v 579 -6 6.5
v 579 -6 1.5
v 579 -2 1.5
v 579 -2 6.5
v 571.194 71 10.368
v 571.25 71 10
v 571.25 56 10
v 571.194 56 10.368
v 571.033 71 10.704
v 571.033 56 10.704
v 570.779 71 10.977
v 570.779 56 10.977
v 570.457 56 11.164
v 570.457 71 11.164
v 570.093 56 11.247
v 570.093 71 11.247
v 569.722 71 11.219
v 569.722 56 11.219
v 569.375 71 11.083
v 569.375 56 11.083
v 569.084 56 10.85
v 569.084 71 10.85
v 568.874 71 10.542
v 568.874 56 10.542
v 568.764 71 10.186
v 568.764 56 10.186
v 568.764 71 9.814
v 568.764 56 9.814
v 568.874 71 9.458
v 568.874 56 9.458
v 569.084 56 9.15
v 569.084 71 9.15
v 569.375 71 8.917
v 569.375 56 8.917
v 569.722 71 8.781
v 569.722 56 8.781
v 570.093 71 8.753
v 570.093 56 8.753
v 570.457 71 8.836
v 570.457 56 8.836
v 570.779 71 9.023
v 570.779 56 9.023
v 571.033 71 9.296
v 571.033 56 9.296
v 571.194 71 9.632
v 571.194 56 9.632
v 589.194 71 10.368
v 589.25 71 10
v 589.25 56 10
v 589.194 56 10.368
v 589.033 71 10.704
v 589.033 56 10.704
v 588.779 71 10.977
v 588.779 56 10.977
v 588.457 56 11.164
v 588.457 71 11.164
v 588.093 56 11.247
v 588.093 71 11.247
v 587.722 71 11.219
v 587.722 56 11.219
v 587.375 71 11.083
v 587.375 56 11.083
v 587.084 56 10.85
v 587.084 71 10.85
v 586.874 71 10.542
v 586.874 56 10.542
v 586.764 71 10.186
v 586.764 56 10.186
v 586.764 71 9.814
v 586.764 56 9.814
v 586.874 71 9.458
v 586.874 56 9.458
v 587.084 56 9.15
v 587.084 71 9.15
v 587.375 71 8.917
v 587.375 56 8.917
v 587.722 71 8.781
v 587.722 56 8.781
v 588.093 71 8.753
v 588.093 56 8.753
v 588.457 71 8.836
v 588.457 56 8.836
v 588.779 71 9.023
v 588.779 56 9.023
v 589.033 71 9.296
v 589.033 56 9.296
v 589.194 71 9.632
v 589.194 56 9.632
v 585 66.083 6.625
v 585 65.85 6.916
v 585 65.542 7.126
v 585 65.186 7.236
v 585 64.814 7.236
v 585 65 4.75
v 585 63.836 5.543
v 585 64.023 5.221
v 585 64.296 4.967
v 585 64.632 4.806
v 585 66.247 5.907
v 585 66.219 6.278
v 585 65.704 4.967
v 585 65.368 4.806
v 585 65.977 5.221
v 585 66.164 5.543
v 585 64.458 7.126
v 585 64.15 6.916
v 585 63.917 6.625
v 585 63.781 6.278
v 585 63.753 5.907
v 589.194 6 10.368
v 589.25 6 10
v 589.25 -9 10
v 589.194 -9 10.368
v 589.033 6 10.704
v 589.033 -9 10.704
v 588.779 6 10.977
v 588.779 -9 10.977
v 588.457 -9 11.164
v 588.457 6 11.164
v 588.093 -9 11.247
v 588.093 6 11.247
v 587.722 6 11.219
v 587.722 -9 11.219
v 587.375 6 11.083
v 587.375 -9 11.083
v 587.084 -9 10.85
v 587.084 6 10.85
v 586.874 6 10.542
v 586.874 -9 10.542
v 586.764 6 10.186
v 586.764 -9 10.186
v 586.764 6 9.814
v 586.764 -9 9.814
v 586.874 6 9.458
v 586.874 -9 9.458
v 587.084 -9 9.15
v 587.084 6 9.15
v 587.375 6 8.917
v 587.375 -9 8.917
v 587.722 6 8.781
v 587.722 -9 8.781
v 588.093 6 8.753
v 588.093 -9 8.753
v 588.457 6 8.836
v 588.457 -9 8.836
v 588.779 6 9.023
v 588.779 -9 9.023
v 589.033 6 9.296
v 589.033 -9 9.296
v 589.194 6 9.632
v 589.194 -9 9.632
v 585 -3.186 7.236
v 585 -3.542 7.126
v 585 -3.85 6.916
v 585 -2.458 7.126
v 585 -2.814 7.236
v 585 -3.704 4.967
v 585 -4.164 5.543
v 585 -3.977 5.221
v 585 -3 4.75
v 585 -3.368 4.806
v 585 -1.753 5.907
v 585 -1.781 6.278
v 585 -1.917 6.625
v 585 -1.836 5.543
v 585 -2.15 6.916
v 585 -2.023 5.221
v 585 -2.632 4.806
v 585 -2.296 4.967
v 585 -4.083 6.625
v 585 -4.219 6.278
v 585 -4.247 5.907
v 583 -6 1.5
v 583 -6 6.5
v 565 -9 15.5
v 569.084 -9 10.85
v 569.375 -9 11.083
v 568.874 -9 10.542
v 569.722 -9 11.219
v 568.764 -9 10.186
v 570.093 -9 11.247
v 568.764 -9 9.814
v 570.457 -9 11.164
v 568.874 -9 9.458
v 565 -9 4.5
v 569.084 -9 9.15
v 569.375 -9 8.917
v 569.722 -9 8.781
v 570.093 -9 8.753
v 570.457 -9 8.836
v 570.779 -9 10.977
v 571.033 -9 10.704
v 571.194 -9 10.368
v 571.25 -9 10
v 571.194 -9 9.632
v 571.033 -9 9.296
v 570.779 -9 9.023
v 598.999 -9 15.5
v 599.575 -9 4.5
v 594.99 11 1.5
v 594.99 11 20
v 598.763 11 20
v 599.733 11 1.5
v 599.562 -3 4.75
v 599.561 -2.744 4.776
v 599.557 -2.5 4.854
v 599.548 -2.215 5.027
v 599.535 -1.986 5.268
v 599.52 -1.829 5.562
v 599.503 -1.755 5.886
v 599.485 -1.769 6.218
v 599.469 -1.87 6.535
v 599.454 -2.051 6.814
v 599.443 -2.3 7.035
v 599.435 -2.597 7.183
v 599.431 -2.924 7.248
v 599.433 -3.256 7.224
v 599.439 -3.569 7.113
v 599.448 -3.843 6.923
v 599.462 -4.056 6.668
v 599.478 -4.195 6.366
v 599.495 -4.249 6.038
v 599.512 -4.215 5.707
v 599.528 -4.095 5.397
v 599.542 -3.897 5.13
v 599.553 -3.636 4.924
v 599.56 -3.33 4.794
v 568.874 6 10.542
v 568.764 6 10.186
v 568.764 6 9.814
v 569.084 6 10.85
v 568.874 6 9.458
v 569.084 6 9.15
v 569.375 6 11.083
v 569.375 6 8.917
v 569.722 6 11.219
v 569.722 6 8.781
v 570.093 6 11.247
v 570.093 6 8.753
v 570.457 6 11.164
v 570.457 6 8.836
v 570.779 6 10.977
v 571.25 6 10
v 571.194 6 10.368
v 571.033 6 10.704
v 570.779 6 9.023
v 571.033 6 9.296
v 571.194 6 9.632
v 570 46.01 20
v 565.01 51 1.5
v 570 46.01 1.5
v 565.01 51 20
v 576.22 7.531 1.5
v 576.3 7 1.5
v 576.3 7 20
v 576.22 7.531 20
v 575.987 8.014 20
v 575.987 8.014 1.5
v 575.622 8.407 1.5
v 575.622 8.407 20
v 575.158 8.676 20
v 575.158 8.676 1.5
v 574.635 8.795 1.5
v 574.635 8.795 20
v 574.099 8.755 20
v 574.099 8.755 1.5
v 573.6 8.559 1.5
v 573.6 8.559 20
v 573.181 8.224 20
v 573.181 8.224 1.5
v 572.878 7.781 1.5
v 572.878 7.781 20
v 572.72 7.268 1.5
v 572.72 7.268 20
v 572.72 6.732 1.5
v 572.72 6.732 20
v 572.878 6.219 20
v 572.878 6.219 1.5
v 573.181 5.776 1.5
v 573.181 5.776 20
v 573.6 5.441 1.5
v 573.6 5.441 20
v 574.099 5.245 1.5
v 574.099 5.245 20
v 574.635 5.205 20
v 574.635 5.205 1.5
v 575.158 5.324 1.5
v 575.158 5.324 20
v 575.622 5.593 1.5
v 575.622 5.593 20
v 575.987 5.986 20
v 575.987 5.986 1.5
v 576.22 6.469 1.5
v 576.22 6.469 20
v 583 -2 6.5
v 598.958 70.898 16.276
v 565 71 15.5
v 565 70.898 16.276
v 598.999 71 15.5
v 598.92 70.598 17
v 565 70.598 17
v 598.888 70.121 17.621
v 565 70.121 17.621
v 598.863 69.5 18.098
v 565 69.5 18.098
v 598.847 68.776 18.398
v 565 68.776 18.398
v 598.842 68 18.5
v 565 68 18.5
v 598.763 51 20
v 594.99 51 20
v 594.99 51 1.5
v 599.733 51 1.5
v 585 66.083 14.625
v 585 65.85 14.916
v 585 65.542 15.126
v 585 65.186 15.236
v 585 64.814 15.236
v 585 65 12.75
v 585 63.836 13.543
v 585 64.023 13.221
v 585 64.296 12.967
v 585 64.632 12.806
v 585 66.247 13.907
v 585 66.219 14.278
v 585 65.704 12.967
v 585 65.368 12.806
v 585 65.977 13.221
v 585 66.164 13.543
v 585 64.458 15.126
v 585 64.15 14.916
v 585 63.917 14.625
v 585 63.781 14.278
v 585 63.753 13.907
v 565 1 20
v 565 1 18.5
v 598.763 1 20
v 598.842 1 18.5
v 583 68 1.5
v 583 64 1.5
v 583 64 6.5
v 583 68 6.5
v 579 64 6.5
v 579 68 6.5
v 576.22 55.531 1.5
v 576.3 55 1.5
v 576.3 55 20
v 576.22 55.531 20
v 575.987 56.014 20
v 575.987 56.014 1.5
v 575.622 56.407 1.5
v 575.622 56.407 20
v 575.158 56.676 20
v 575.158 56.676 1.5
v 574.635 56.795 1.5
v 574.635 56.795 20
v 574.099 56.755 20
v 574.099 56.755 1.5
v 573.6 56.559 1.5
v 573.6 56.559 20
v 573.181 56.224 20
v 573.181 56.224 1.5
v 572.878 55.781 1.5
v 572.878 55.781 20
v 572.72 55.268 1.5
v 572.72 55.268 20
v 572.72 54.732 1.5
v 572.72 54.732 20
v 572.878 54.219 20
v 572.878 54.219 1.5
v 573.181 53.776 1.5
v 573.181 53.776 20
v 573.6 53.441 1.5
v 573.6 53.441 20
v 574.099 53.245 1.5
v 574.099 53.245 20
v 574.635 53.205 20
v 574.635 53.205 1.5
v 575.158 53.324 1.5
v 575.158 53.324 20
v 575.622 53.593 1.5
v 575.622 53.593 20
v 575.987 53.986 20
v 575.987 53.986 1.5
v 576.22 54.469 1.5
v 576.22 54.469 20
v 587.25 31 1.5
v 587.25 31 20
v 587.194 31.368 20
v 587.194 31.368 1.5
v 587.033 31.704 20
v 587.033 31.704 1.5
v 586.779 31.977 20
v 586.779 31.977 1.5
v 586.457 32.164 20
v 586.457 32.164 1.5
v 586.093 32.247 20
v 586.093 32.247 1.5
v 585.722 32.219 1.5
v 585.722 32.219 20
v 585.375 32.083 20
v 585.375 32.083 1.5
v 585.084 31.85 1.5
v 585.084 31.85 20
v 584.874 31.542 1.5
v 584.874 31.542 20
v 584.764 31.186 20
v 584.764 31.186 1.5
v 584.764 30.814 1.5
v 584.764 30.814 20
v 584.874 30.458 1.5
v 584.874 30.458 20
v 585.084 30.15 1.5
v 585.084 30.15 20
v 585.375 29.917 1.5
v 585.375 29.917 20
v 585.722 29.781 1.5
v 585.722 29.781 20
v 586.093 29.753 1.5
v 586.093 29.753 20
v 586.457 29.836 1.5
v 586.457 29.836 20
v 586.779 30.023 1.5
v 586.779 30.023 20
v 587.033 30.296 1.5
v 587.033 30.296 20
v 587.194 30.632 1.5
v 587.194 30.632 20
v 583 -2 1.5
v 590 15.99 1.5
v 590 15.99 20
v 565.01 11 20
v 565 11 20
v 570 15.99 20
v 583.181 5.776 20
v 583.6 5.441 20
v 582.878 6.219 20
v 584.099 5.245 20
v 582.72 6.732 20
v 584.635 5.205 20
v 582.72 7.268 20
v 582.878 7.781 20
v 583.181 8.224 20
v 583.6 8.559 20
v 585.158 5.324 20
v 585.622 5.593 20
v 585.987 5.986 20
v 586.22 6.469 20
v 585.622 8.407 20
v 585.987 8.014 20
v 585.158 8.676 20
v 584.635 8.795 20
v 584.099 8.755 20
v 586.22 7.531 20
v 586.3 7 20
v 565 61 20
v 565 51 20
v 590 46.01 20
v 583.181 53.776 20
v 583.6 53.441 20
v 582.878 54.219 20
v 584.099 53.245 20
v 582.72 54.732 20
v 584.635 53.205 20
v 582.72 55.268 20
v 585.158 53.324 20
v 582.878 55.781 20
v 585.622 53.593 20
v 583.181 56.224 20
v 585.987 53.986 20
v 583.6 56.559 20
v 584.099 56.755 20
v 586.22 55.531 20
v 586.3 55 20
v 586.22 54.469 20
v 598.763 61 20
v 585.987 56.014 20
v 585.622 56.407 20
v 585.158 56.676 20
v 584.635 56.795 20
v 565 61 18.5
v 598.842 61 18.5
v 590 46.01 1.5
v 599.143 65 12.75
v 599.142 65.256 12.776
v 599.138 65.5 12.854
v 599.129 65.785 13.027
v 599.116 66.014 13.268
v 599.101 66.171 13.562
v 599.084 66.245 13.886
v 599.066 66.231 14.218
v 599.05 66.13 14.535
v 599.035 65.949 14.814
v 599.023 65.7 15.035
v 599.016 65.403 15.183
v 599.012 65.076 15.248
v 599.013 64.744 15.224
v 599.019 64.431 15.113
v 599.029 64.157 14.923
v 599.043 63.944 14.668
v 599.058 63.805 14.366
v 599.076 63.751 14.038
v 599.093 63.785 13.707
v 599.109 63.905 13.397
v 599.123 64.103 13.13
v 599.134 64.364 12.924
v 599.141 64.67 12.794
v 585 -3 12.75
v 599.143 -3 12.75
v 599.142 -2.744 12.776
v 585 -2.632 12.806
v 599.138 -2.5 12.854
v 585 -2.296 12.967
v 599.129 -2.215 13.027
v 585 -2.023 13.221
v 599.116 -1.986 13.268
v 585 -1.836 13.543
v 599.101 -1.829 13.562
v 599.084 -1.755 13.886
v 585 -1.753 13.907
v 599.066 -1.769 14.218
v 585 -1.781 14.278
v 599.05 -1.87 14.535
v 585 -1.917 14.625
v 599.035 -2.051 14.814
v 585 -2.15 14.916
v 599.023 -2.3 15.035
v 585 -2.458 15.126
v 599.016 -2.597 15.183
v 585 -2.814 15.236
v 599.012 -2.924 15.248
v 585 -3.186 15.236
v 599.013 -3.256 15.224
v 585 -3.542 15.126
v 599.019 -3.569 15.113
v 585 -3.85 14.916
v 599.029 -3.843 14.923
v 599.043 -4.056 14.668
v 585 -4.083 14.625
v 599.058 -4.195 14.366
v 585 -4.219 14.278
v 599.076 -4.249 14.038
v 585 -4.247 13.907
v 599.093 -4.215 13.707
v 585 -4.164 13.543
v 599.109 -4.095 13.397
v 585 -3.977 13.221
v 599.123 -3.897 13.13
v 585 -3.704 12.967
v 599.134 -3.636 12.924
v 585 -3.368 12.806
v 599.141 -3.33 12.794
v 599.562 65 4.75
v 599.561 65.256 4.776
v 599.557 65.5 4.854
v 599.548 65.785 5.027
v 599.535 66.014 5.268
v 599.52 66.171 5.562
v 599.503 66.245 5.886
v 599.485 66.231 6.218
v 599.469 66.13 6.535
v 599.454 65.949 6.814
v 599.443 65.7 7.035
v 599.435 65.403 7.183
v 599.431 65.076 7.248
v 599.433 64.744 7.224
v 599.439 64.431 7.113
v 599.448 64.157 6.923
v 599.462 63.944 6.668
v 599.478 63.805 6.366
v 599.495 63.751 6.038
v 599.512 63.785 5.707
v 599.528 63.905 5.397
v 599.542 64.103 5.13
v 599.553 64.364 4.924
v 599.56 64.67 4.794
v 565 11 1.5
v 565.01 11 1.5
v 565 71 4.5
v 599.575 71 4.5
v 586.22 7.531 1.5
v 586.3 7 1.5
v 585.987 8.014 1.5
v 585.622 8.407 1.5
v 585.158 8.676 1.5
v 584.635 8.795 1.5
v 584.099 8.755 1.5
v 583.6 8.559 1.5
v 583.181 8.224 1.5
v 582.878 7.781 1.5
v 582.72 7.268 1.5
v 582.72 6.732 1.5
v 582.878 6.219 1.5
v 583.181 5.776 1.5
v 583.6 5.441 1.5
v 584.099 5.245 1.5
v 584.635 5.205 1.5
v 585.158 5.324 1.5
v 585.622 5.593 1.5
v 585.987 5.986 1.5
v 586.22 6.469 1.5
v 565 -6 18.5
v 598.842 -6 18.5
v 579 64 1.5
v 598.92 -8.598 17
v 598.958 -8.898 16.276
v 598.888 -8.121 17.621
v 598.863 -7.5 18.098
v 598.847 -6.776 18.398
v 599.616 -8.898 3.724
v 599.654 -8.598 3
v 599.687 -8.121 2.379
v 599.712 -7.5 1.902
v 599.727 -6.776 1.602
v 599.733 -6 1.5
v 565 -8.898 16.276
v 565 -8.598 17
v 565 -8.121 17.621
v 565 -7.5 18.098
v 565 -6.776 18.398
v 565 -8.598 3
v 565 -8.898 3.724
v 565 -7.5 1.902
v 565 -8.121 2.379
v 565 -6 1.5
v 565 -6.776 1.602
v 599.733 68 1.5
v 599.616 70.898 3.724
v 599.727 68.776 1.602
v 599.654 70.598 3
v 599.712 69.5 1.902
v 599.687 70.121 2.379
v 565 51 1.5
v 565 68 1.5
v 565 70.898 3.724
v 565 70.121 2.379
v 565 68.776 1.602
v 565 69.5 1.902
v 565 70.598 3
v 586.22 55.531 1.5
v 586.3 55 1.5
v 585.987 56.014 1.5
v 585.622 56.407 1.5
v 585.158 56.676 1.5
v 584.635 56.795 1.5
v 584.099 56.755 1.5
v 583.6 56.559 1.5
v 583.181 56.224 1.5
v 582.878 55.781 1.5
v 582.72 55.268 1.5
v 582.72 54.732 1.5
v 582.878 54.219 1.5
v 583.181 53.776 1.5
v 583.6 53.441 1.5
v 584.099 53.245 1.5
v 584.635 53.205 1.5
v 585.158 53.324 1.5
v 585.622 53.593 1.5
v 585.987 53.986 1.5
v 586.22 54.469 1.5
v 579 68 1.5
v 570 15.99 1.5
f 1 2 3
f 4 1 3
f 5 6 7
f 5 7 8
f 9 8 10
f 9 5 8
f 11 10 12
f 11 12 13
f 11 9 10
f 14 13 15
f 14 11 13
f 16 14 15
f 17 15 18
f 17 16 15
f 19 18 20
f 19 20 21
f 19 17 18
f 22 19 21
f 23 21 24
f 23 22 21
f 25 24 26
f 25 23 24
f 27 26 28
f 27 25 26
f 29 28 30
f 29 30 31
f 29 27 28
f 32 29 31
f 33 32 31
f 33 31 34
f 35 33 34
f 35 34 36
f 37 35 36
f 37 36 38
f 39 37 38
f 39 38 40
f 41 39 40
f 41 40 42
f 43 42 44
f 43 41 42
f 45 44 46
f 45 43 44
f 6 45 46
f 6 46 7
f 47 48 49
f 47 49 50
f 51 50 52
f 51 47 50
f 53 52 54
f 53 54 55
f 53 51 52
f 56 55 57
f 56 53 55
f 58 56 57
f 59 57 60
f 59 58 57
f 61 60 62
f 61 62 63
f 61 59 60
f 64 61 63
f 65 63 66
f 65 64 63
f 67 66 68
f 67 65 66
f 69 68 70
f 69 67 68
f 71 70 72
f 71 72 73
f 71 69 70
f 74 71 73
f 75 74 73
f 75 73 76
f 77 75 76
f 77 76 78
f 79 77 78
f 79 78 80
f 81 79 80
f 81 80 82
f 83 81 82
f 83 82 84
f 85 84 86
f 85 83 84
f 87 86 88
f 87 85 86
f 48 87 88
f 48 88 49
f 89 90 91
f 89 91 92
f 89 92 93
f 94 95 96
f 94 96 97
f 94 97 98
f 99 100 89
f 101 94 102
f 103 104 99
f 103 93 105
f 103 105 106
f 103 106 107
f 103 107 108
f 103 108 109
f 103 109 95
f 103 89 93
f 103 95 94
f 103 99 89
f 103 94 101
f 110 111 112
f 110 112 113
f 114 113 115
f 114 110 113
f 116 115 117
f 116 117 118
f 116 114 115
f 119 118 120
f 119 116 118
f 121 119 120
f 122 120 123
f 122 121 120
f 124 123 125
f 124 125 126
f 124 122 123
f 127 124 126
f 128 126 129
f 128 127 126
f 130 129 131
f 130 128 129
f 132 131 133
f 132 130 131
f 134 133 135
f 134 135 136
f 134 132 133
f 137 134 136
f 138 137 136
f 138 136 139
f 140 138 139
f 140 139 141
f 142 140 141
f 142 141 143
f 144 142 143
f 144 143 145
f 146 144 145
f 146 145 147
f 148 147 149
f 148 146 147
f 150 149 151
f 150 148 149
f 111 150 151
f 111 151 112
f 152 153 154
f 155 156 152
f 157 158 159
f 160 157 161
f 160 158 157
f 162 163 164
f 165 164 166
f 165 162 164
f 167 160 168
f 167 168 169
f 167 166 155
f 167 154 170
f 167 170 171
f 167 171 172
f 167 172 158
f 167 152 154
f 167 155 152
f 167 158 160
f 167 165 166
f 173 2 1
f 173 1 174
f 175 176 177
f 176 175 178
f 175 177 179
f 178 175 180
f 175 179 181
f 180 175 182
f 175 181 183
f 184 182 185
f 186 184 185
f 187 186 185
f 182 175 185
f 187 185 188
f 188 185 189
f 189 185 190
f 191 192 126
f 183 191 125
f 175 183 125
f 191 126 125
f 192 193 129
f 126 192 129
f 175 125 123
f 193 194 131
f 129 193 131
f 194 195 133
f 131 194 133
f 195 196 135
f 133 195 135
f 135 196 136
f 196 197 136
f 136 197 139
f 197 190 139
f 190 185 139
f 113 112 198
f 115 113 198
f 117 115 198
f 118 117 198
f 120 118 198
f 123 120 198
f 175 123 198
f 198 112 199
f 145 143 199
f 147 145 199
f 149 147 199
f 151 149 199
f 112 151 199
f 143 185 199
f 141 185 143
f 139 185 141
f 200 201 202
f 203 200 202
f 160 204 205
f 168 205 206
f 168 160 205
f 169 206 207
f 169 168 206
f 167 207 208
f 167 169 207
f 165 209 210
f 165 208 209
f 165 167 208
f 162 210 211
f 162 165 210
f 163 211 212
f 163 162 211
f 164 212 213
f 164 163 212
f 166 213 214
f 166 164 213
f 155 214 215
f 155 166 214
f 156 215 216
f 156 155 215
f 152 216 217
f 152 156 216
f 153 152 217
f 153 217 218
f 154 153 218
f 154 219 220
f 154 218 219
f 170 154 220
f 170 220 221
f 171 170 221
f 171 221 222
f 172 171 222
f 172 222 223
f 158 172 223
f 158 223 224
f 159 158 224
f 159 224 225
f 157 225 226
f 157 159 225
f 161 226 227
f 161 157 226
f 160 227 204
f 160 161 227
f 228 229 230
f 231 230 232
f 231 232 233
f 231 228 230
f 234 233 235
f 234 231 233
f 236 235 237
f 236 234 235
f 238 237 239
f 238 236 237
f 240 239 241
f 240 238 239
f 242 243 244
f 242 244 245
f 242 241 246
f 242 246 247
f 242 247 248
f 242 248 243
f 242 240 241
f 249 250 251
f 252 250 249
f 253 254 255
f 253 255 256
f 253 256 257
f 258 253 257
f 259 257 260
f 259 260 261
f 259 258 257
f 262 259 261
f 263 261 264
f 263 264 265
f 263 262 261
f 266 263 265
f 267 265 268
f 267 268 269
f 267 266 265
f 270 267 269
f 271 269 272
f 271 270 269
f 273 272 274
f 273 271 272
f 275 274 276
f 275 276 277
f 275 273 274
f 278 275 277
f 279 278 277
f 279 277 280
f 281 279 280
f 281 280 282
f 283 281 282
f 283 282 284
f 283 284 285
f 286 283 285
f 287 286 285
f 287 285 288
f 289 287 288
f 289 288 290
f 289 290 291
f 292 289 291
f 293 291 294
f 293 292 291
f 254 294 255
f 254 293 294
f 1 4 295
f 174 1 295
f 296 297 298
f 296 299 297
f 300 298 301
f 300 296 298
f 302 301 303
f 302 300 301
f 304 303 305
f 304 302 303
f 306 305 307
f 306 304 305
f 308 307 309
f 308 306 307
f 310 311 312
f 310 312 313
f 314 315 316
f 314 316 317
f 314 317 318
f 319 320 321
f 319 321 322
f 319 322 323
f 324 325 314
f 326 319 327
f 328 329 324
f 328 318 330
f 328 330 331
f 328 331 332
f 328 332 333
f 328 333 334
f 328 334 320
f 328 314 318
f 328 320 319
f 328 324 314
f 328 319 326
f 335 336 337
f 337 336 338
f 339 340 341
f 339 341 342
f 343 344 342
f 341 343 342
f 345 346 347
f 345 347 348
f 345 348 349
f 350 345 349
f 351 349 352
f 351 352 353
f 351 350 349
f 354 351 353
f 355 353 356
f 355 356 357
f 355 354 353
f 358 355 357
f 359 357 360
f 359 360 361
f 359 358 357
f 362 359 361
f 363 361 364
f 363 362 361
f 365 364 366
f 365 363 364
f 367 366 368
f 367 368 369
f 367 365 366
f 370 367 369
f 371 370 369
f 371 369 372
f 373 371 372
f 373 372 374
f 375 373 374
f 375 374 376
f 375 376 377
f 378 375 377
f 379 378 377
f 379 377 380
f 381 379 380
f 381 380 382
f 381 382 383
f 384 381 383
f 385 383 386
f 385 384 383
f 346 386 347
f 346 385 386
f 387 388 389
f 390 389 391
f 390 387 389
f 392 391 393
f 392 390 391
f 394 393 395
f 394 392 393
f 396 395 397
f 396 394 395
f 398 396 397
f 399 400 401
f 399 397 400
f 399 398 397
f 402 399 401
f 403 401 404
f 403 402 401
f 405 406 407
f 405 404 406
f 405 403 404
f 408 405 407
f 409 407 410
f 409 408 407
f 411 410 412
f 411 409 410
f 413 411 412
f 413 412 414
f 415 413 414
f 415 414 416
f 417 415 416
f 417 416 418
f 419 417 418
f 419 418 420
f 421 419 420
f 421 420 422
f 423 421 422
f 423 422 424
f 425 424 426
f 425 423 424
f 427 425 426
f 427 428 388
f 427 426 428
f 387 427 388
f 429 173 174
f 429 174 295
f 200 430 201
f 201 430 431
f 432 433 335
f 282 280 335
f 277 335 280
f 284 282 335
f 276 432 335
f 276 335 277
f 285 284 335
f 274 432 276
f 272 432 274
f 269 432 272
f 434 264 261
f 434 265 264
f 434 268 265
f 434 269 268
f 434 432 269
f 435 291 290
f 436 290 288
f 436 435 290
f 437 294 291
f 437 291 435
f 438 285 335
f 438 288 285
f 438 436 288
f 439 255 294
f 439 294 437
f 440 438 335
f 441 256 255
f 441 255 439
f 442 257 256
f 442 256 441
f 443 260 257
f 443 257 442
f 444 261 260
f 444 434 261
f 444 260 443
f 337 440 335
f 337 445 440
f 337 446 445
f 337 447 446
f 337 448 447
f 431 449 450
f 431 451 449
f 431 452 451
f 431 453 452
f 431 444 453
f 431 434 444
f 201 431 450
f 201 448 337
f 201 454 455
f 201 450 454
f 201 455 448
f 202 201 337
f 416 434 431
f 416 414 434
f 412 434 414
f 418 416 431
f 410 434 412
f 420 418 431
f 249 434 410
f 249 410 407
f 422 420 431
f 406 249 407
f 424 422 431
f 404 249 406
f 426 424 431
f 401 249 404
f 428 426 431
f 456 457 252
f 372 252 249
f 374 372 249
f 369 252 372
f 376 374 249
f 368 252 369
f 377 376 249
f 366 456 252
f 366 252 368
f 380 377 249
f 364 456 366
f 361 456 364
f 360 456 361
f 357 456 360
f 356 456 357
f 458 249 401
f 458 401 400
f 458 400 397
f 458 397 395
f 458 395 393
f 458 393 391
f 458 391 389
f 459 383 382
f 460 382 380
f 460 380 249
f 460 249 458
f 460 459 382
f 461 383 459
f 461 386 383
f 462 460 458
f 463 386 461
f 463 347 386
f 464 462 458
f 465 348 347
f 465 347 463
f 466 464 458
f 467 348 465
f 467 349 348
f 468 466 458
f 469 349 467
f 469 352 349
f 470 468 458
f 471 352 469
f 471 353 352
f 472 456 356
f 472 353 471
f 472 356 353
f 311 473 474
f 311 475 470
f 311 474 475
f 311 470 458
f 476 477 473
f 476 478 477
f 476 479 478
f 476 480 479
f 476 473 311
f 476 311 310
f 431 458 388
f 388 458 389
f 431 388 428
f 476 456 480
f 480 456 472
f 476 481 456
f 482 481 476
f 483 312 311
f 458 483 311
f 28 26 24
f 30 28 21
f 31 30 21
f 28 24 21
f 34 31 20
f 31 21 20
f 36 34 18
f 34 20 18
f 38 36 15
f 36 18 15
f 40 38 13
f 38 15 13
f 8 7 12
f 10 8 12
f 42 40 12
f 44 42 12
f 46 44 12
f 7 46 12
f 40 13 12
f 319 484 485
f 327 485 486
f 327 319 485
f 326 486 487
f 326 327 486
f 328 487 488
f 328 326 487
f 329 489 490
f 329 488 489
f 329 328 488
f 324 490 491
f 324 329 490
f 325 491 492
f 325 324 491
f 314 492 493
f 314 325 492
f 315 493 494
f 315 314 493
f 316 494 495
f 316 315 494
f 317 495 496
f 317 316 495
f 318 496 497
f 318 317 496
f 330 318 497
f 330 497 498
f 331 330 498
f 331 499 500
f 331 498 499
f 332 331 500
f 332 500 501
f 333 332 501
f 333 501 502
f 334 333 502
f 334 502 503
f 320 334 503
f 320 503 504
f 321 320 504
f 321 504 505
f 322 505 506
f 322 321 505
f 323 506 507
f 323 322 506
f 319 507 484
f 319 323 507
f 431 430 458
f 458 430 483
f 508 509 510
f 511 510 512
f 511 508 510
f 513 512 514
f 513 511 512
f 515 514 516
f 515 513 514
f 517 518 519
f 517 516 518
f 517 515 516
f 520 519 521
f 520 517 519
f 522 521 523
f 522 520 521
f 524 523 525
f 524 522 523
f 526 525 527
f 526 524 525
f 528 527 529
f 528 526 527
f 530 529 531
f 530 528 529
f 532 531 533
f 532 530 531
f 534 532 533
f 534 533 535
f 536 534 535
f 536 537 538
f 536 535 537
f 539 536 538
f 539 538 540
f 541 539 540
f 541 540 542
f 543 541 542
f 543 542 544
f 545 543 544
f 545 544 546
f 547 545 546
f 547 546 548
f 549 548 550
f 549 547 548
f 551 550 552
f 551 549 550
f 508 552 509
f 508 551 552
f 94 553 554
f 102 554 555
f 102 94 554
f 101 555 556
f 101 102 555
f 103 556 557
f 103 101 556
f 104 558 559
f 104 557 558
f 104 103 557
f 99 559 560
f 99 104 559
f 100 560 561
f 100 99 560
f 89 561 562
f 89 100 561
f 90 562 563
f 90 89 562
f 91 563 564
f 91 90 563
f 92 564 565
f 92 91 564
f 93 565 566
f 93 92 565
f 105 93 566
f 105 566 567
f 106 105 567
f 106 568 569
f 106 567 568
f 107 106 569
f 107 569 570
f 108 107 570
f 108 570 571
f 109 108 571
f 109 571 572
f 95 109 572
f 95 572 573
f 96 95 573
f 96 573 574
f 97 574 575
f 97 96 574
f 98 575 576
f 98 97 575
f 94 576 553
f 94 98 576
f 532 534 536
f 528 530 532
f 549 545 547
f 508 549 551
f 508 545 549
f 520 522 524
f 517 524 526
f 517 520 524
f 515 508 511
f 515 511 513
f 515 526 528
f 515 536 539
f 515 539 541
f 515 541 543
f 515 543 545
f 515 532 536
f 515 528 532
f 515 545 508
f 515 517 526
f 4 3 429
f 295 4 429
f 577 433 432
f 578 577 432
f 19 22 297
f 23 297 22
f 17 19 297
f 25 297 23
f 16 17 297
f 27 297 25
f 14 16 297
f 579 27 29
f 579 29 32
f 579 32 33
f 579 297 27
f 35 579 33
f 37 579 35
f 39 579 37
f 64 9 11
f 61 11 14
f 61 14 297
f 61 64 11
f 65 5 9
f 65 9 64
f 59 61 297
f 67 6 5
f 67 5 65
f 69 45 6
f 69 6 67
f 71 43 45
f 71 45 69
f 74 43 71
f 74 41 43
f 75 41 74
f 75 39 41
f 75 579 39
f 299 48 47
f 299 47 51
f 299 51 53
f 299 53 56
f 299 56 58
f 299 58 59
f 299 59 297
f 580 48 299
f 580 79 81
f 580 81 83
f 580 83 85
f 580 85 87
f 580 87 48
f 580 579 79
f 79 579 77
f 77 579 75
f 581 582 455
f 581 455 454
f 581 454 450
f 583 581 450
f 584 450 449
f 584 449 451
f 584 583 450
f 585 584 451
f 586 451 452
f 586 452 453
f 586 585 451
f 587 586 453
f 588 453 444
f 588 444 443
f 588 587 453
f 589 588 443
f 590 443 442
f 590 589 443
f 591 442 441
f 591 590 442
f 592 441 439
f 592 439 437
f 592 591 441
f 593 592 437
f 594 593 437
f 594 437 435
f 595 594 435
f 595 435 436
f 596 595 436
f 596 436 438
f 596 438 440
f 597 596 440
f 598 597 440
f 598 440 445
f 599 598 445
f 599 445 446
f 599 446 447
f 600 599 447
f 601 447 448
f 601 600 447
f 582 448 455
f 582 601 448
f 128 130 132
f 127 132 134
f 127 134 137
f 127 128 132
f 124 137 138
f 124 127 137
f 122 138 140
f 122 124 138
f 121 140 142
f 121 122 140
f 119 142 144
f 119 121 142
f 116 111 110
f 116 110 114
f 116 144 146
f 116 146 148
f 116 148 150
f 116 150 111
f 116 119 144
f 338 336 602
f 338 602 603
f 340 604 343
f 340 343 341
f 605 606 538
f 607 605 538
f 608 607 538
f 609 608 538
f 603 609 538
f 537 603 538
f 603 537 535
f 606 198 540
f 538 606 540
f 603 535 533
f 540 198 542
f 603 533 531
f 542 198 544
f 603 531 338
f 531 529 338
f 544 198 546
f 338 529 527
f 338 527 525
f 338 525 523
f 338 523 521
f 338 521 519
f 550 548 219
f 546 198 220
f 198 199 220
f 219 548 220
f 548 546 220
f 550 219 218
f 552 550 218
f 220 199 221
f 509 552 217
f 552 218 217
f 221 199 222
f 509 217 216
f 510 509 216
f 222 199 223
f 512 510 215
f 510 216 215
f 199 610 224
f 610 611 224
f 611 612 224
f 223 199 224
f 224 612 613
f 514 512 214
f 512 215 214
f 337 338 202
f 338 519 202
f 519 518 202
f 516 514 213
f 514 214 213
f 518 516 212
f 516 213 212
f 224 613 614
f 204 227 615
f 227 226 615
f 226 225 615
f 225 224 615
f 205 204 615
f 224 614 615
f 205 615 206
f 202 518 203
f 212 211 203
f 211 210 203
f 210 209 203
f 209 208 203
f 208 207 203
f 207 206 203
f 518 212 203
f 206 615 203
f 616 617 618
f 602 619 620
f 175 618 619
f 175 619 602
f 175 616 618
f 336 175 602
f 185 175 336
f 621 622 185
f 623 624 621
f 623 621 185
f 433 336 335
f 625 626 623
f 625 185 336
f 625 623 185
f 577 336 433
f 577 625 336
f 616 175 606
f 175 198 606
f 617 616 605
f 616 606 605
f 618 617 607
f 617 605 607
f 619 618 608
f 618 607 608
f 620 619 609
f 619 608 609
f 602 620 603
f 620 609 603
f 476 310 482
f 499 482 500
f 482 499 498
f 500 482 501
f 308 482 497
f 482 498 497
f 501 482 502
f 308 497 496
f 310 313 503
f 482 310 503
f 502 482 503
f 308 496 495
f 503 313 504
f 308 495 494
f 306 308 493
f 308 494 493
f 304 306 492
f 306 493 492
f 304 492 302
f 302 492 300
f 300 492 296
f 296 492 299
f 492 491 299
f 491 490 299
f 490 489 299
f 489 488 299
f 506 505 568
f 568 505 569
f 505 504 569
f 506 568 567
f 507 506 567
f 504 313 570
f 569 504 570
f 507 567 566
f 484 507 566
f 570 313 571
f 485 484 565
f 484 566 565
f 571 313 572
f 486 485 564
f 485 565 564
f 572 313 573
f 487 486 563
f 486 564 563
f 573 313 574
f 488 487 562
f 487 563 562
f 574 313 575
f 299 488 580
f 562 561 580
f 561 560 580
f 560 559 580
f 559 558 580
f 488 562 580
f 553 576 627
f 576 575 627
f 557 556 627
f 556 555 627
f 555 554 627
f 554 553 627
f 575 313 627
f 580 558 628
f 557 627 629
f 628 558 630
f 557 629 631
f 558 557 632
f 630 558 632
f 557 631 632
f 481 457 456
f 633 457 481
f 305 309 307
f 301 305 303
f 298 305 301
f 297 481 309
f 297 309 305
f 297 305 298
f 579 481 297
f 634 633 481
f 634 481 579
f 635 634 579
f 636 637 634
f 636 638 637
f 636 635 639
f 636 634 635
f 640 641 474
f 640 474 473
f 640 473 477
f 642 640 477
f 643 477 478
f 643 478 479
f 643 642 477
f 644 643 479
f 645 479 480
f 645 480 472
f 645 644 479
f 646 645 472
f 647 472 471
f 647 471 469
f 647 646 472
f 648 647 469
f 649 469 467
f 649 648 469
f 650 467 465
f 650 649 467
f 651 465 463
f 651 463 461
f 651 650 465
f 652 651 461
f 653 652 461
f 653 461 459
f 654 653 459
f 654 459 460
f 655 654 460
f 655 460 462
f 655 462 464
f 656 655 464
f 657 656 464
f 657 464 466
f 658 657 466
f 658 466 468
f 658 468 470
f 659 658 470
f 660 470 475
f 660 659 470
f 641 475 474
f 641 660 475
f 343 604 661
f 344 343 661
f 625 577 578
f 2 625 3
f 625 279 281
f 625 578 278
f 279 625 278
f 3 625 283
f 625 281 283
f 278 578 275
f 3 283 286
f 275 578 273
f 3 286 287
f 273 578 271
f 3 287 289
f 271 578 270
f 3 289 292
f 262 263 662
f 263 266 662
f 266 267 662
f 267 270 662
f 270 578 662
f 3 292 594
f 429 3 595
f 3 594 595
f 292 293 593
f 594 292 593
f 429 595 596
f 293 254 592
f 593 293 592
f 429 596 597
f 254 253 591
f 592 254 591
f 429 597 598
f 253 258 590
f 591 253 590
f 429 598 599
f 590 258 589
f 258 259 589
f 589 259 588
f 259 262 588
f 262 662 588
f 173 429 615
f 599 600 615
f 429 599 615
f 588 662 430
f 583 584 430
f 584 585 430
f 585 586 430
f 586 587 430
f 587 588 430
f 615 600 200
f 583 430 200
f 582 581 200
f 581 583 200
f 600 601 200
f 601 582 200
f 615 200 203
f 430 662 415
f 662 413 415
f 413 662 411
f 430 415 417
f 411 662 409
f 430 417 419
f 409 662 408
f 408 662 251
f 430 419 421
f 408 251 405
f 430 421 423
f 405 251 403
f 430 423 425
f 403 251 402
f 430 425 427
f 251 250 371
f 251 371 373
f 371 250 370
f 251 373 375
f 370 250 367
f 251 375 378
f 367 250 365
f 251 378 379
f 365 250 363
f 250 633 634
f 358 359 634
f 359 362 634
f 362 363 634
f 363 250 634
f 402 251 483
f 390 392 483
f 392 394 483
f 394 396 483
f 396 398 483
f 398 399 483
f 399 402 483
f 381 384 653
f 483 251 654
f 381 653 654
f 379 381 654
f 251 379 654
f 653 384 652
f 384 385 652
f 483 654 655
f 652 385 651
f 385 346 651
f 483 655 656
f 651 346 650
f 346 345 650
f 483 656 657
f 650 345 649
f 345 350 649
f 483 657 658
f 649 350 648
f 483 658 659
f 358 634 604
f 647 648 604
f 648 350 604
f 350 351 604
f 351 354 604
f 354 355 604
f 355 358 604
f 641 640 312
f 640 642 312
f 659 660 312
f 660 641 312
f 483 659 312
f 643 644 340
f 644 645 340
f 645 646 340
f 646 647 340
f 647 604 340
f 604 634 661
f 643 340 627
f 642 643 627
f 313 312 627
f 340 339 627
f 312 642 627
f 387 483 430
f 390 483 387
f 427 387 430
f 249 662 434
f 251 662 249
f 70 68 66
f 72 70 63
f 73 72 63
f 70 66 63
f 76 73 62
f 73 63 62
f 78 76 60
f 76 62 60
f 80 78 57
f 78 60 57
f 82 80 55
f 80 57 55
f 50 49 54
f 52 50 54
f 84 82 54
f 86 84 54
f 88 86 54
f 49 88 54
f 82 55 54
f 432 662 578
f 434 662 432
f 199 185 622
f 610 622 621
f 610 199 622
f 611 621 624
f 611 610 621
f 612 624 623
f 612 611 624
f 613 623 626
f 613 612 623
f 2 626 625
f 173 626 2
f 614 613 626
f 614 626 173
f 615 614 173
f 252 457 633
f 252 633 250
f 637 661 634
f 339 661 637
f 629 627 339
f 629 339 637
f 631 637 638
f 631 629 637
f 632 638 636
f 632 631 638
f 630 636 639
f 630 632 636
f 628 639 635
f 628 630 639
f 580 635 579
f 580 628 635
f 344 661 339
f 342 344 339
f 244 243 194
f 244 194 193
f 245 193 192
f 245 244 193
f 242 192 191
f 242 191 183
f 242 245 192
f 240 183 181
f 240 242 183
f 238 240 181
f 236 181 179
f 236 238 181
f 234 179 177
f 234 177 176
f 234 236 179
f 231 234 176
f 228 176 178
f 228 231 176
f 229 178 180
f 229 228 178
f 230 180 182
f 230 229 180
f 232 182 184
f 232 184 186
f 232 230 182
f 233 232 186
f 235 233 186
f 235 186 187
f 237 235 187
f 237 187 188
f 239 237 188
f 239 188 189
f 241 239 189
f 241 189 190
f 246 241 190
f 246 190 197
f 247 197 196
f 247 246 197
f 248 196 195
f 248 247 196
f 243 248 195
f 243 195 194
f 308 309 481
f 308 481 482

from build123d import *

# Parameters (mm, degrees)
CYLINDER445_R          = 1.25
CYLINDER445_DEPTH      = 20
BOX297_W               = 4
BOX297_H               = 4
BOX297_DEPTH           = 5
BOX298_W               = 4
BOX298_H               = 4
BOX298_DEPTH           = 5
CYLINDER444_R          = 1.25
CYLINDER444_DEPTH      = 15
CYLINDER443_R          = 1.25
CYLINDER443_DEPTH      = 15
CYLINDER442_R          = 1.25
CYLINDER442_DEPTH      = 15
CYLINDER441_R          = 1.25
CYLINDER441_DEPTH      = 15
CYLINDER450_R          = 1.8
CYLINDER450_DEPTH      = 18.5
CYLINDER451_R          = 1.8
CYLINDER451_DEPTH      = 18.5
CYLINDER446_R          = 1.8
CYLINDER446_DEPTH      = 18.5
CYLINDER447_R          = 1.8
CYLINDER447_DEPTH      = 18.5
CYLINDER449_R          = 1.25
CYLINDER449_DEPTH      = 15
CYLINDER448_R          = 1.25
CYLINDER448_DEPTH      = 15
CYLINDER440_R          = 1.25
CYLINDER440_DEPTH      = 15
CYLINDER439_R          = 1.25
CYLINDER439_DEPTH      = 15
BOX293_W               = 10
BOX293_H               = 82
BOX293_DEPTH           = 32
BOX293_PLACEMENT_ANGLE = 3
BOX300_W               = 35
BOX300_H               = 10
BOX300_DEPTH           = 1.5
BOX295_W               = 35
BOX295_H               = 20
BOX295_DEPTH           = 17
BOX292_W               = 35
BOX292_H               = 20
BOX292_DEPTH           = 17
BOX296_W               = 20
BOX296_H               = 40
BOX296_DEPTH           = 18.5
BOX299_W               = 35
BOX299_H               = 10
BOX299_DEPTH           = 1.5
FILLET107_R            = 3
CHAMFER030_SIZE        = 4.99


with BuildPart() as cylinder445:
    # Cylinder445 → Cylinder445 (new body)
    with BuildSketch(Plane(origin=(586, 31, 1.5), x_dir=(1, 0, 0), z_dir=(0, 0, 1))):
        Circle(CYLINDER445_R)
    extrude(amount=CYLINDER445_DEPTH)


with BuildPart() as box297:
    # Box297 → Box297 (new body)
    with BuildSketch(Plane(origin=(579, -6, 1.5), x_dir=(1, 0, 0), z_dir=(0, 0, 1))):
        with Locations((2, 2)):
            Rectangle(BOX297_W, BOX297_H)
    extrude(amount=BOX297_DEPTH)


with BuildPart() as fusion398:
    # Box298 → Box298 (new body)
    with BuildSketch(Plane(origin=(579, 64, 1.5), x_dir=(1, 0, 0), z_dir=(0, 0, 1))):
        with Locations((2, 2)):
            Rectangle(BOX298_W, BOX298_H)
    extrude(amount=BOX298_DEPTH)

    # Fusion398: union Box297
    add(box297.part)


with BuildPart() as cylinder444:
    # Cylinder444 → Cylinder444 (new body)
    with BuildSketch(Plane(origin=(585, 7, 6), x_dir=(0, 0, -1), z_dir=(1, 0, 0))):
        Circle(CYLINDER444_R)
    extrude(amount=CYLINDER444_DEPTH)


with BuildPart() as fusion396:
    # Cylinder443 → Cylinder443 (new body)
    with BuildSketch(Plane(origin=(585, 7, 14), x_dir=(0, 0, -1), z_dir=(1, 0, 0))):
        Circle(CYLINDER443_R)
    extrude(amount=CYLINDER443_DEPTH)

    # Fusion396: union Cylinder444
    add(cylinder444.part)


with BuildPart() as fusion396_1:
    # Fusion396 placement: moved
    add(fusion396.part.moved(Location((0, 58, 0))))


with BuildPart() as cylinder442:
    # Cylinder442 → Cylinder442 (new body)
    with BuildSketch(Plane(origin=(585, 7, 6), x_dir=(0, 0, -1), z_dir=(1, 0, 0))):
        Circle(CYLINDER442_R)
    extrude(amount=CYLINDER442_DEPTH)


with BuildPart() as fusion397:
    # Cylinder441 → Cylinder441 (new body)
    with BuildSketch(Plane(origin=(585, 7, 14), x_dir=(0, 0, -1), z_dir=(1, 0, 0))):
        Circle(CYLINDER441_R)
    extrude(amount=CYLINDER441_DEPTH)

    # Fusion395: union Cylinder442
    add(cylinder442.part)


with BuildPart() as fusion397_1:
    # Fusion395 placement: moved
    add(fusion397.part.moved(Location((0, -10, 0))))

    # Fusion397: union Fusion396
    add(fusion396_1.part)


with BuildPart() as cylinder450:
    # Cylinder450 → Cylinder450 (new body)
    with BuildSketch(Plane(origin=(584, 7, 10.5), x_dir=(1, 0, 0), z_dir=(0, 0, 1))):
        Circle(CYLINDER450_R)
    extrude(amount=CYLINDER450_DEPTH)


with BuildPart() as fusion403:
    # Cylinder451 → Cylinder451 (new body)
    with BuildSketch(Plane(origin=(584, 55, 10.5), x_dir=(1, 0, 0), z_dir=(0, 0, 1))):
        Circle(CYLINDER451_R)
    extrude(amount=CYLINDER451_DEPTH)

    # Fusion403: union Cylinder450
    add(cylinder450.part)


with BuildPart() as fusion403_1:
    # Fusion403 placement: moved
    add(fusion403.part.moved(Location((-9.5, 0, -9))))


with BuildPart() as cylinder446:
    # Cylinder446 → Cylinder446 (new body)
    with BuildSketch(Plane(origin=(584, 7, 10.5), x_dir=(1, 0, 0), z_dir=(0, 0, 1))):
        Circle(CYLINDER446_R)
    extrude(amount=CYLINDER446_DEPTH)


with BuildPart() as fusion405:
    # Cylinder447 → Cylinder447 (new body)
    with BuildSketch(Plane(origin=(584, 55, 10.5), x_dir=(1, 0, 0), z_dir=(0, 0, 1))):
        Circle(CYLINDER447_R)
    extrude(amount=CYLINDER447_DEPTH)

    # Fusion399: union Cylinder446
    add(cylinder446.part)


with BuildPart() as fusion405_1:
    # Fusion399 placement: moved
    add(fusion405.part.moved(Location((0.5, 0, -9))))

    # Fusion405: union Fusion403
    add(fusion403_1.part)


with BuildPart() as cylinder449:
    # Cylinder449 → Cylinder449 (new body)
    with BuildSketch(Plane(origin=(588, 71, 10), x_dir=(1, 0, 0), z_dir=(0, -1, 0))):
        Circle(CYLINDER449_R)
    extrude(amount=CYLINDER449_DEPTH)


with BuildPart() as fusion401:
    # Cylinder448 → Cylinder448 (new body)
    with BuildSketch(Plane(origin=(588, 6, 10), x_dir=(1, 0, 0), z_dir=(0, -1, 0))):
        Circle(CYLINDER448_R)
    extrude(amount=CYLINDER448_DEPTH)

    # Fusion401: union Cylinder449
    add(cylinder449.part)


with BuildPart() as fusion401_1:
    # Fusion401 placement: moved
    add(fusion401.part.moved(Location((-18, 0, 0))))


with BuildPart() as cylinder440:
    # Cylinder440 → Cylinder440 (new body)
    with BuildSketch(Plane(origin=(588, 71, 10), x_dir=(1, 0, 0), z_dir=(0, -1, 0))):
        Circle(CYLINDER440_R)
    extrude(amount=CYLINDER440_DEPTH)


with BuildPart() as fusion404:
    # Cylinder439 → Cylinder439 (new body)
    with BuildSketch(Plane(origin=(588, 6, 10), x_dir=(1, 0, 0), z_dir=(0, -1, 0))):
        Circle(CYLINDER439_R)
    extrude(amount=CYLINDER439_DEPTH)

    # Fusion394: union Cylinder440
    add(cylinder440.part)

    # Fusion404: union Fusion401
    add(fusion401_1.part)


with BuildPart() as box293:
    # Box293 → Box293 (new body)
    with BuildSketch(Plane.XY):
        with Locations((5, 41)):
            Rectangle(BOX293_W, BOX293_H)
    extrude(amount=BOX293_DEPTH)


with BuildPart() as box293_1:
    # Box293 placement: moved
    add(box293.part.moved(Location((600, -10, -3.6))).rotate(Axis((600, -10, -3.6), (0, -1, 0)), BOX293_PLACEMENT_ANGLE))


with BuildPart() as box300:
    # Box300 → Box300 (new body)
    with BuildSketch(Plane(origin=(565, 1, 18.5), x_dir=(1, 0, 0), z_dir=(0, 0, 1))):
        with Locations((17.5, 5)):
            Rectangle(BOX300_W, BOX300_H)
    extrude(amount=BOX300_DEPTH)


with BuildPart() as box295:
    # Box295 → Box295 (new body)
    with BuildSketch(Plane(origin=(565, 51, 1.5), x_dir=(1, 0, 0), z_dir=(0, 0, 1))):
        with Locations((17.5, 10)):
            Rectangle(BOX295_W, BOX295_H)
    extrude(amount=BOX295_DEPTH)


with BuildPart() as box292:
    # Box292 → Box292 (new body)
    with BuildSketch(Plane(origin=(565, -9, 1.5), x_dir=(1, 0, 0), z_dir=(0, 0, 1))):
        with Locations((17.5, 10)):
            Rectangle(BOX292_W, BOX292_H)
    extrude(amount=BOX292_DEPTH)


with BuildPart() as box296:
    # Box296 → Box296 (new body)
    with BuildSketch(Plane(origin=(570, 11, 1.5), x_dir=(1, 0, 0), z_dir=(0, 0, 1))):
        with Locations((10, 20)):
            Rectangle(BOX296_W, BOX296_H)
    extrude(amount=BOX296_DEPTH)


with BuildPart() as rear_cross_member_wide:
    # Box299 → Box299 (new body)
    with BuildSketch(Plane(origin=(565, 51, 18.5), x_dir=(1, 0, 0), z_dir=(0, 0, 1))):
        with Locations((17.5, 5)):
            Rectangle(BOX299_W, BOX299_H)
    extrude(amount=BOX299_DEPTH)

    # Fusion402: union Box300, Box295, Box292, Box296
    add(box300.part)
    add(box295.part)
    add(box292.part)
    add(box296.part)

    # Cut293: cut Box293
    add(box293_1.part, mode=Mode.SUBTRACT)

    # Cut294: cut Fusion404
    add(fusion404.part, mode=Mode.SUBTRACT)

    # Cut295: cut Fusion405
    add(fusion405_1.part, mode=Mode.SUBTRACT)

    # Fillet107
    fillet107_edges = [rear_cross_member_wide.edges().sort_by_distance(p)[0] for p in [
        (582.36636, 71, 1.5),
        (581.920894, 71, 18.5),
        (582.36636, -9, 1.5),
        (581.920894, -9, 18.5),
    ]]
    fillet(fillet107_edges, radius=FILLET107_R)

    # Chamfer030
    chamfer030_edges = [rear_cross_member_wide.edges().sort_by_distance(p)[0] for p in [
        (570, 51, 10.75),
        (590, 51, 10.75),
        (570, 11, 10.75),
        (590, 11, 10.75),
    ]]
    chamfer(chamfer030_edges, length=CHAMFER030_SIZE)

    # Cut296: cut Fusion397
    add(fusion397_1.part, mode=Mode.SUBTRACT)

    # Cut297: cut Fusion398
    add(fusion398.part, mode=Mode.SUBTRACT)

    # Cut298: cut Cylinder445
    add(cylinder445.part, mode=Mode.SUBTRACT)


solid = rear_cross_member_wide.part
